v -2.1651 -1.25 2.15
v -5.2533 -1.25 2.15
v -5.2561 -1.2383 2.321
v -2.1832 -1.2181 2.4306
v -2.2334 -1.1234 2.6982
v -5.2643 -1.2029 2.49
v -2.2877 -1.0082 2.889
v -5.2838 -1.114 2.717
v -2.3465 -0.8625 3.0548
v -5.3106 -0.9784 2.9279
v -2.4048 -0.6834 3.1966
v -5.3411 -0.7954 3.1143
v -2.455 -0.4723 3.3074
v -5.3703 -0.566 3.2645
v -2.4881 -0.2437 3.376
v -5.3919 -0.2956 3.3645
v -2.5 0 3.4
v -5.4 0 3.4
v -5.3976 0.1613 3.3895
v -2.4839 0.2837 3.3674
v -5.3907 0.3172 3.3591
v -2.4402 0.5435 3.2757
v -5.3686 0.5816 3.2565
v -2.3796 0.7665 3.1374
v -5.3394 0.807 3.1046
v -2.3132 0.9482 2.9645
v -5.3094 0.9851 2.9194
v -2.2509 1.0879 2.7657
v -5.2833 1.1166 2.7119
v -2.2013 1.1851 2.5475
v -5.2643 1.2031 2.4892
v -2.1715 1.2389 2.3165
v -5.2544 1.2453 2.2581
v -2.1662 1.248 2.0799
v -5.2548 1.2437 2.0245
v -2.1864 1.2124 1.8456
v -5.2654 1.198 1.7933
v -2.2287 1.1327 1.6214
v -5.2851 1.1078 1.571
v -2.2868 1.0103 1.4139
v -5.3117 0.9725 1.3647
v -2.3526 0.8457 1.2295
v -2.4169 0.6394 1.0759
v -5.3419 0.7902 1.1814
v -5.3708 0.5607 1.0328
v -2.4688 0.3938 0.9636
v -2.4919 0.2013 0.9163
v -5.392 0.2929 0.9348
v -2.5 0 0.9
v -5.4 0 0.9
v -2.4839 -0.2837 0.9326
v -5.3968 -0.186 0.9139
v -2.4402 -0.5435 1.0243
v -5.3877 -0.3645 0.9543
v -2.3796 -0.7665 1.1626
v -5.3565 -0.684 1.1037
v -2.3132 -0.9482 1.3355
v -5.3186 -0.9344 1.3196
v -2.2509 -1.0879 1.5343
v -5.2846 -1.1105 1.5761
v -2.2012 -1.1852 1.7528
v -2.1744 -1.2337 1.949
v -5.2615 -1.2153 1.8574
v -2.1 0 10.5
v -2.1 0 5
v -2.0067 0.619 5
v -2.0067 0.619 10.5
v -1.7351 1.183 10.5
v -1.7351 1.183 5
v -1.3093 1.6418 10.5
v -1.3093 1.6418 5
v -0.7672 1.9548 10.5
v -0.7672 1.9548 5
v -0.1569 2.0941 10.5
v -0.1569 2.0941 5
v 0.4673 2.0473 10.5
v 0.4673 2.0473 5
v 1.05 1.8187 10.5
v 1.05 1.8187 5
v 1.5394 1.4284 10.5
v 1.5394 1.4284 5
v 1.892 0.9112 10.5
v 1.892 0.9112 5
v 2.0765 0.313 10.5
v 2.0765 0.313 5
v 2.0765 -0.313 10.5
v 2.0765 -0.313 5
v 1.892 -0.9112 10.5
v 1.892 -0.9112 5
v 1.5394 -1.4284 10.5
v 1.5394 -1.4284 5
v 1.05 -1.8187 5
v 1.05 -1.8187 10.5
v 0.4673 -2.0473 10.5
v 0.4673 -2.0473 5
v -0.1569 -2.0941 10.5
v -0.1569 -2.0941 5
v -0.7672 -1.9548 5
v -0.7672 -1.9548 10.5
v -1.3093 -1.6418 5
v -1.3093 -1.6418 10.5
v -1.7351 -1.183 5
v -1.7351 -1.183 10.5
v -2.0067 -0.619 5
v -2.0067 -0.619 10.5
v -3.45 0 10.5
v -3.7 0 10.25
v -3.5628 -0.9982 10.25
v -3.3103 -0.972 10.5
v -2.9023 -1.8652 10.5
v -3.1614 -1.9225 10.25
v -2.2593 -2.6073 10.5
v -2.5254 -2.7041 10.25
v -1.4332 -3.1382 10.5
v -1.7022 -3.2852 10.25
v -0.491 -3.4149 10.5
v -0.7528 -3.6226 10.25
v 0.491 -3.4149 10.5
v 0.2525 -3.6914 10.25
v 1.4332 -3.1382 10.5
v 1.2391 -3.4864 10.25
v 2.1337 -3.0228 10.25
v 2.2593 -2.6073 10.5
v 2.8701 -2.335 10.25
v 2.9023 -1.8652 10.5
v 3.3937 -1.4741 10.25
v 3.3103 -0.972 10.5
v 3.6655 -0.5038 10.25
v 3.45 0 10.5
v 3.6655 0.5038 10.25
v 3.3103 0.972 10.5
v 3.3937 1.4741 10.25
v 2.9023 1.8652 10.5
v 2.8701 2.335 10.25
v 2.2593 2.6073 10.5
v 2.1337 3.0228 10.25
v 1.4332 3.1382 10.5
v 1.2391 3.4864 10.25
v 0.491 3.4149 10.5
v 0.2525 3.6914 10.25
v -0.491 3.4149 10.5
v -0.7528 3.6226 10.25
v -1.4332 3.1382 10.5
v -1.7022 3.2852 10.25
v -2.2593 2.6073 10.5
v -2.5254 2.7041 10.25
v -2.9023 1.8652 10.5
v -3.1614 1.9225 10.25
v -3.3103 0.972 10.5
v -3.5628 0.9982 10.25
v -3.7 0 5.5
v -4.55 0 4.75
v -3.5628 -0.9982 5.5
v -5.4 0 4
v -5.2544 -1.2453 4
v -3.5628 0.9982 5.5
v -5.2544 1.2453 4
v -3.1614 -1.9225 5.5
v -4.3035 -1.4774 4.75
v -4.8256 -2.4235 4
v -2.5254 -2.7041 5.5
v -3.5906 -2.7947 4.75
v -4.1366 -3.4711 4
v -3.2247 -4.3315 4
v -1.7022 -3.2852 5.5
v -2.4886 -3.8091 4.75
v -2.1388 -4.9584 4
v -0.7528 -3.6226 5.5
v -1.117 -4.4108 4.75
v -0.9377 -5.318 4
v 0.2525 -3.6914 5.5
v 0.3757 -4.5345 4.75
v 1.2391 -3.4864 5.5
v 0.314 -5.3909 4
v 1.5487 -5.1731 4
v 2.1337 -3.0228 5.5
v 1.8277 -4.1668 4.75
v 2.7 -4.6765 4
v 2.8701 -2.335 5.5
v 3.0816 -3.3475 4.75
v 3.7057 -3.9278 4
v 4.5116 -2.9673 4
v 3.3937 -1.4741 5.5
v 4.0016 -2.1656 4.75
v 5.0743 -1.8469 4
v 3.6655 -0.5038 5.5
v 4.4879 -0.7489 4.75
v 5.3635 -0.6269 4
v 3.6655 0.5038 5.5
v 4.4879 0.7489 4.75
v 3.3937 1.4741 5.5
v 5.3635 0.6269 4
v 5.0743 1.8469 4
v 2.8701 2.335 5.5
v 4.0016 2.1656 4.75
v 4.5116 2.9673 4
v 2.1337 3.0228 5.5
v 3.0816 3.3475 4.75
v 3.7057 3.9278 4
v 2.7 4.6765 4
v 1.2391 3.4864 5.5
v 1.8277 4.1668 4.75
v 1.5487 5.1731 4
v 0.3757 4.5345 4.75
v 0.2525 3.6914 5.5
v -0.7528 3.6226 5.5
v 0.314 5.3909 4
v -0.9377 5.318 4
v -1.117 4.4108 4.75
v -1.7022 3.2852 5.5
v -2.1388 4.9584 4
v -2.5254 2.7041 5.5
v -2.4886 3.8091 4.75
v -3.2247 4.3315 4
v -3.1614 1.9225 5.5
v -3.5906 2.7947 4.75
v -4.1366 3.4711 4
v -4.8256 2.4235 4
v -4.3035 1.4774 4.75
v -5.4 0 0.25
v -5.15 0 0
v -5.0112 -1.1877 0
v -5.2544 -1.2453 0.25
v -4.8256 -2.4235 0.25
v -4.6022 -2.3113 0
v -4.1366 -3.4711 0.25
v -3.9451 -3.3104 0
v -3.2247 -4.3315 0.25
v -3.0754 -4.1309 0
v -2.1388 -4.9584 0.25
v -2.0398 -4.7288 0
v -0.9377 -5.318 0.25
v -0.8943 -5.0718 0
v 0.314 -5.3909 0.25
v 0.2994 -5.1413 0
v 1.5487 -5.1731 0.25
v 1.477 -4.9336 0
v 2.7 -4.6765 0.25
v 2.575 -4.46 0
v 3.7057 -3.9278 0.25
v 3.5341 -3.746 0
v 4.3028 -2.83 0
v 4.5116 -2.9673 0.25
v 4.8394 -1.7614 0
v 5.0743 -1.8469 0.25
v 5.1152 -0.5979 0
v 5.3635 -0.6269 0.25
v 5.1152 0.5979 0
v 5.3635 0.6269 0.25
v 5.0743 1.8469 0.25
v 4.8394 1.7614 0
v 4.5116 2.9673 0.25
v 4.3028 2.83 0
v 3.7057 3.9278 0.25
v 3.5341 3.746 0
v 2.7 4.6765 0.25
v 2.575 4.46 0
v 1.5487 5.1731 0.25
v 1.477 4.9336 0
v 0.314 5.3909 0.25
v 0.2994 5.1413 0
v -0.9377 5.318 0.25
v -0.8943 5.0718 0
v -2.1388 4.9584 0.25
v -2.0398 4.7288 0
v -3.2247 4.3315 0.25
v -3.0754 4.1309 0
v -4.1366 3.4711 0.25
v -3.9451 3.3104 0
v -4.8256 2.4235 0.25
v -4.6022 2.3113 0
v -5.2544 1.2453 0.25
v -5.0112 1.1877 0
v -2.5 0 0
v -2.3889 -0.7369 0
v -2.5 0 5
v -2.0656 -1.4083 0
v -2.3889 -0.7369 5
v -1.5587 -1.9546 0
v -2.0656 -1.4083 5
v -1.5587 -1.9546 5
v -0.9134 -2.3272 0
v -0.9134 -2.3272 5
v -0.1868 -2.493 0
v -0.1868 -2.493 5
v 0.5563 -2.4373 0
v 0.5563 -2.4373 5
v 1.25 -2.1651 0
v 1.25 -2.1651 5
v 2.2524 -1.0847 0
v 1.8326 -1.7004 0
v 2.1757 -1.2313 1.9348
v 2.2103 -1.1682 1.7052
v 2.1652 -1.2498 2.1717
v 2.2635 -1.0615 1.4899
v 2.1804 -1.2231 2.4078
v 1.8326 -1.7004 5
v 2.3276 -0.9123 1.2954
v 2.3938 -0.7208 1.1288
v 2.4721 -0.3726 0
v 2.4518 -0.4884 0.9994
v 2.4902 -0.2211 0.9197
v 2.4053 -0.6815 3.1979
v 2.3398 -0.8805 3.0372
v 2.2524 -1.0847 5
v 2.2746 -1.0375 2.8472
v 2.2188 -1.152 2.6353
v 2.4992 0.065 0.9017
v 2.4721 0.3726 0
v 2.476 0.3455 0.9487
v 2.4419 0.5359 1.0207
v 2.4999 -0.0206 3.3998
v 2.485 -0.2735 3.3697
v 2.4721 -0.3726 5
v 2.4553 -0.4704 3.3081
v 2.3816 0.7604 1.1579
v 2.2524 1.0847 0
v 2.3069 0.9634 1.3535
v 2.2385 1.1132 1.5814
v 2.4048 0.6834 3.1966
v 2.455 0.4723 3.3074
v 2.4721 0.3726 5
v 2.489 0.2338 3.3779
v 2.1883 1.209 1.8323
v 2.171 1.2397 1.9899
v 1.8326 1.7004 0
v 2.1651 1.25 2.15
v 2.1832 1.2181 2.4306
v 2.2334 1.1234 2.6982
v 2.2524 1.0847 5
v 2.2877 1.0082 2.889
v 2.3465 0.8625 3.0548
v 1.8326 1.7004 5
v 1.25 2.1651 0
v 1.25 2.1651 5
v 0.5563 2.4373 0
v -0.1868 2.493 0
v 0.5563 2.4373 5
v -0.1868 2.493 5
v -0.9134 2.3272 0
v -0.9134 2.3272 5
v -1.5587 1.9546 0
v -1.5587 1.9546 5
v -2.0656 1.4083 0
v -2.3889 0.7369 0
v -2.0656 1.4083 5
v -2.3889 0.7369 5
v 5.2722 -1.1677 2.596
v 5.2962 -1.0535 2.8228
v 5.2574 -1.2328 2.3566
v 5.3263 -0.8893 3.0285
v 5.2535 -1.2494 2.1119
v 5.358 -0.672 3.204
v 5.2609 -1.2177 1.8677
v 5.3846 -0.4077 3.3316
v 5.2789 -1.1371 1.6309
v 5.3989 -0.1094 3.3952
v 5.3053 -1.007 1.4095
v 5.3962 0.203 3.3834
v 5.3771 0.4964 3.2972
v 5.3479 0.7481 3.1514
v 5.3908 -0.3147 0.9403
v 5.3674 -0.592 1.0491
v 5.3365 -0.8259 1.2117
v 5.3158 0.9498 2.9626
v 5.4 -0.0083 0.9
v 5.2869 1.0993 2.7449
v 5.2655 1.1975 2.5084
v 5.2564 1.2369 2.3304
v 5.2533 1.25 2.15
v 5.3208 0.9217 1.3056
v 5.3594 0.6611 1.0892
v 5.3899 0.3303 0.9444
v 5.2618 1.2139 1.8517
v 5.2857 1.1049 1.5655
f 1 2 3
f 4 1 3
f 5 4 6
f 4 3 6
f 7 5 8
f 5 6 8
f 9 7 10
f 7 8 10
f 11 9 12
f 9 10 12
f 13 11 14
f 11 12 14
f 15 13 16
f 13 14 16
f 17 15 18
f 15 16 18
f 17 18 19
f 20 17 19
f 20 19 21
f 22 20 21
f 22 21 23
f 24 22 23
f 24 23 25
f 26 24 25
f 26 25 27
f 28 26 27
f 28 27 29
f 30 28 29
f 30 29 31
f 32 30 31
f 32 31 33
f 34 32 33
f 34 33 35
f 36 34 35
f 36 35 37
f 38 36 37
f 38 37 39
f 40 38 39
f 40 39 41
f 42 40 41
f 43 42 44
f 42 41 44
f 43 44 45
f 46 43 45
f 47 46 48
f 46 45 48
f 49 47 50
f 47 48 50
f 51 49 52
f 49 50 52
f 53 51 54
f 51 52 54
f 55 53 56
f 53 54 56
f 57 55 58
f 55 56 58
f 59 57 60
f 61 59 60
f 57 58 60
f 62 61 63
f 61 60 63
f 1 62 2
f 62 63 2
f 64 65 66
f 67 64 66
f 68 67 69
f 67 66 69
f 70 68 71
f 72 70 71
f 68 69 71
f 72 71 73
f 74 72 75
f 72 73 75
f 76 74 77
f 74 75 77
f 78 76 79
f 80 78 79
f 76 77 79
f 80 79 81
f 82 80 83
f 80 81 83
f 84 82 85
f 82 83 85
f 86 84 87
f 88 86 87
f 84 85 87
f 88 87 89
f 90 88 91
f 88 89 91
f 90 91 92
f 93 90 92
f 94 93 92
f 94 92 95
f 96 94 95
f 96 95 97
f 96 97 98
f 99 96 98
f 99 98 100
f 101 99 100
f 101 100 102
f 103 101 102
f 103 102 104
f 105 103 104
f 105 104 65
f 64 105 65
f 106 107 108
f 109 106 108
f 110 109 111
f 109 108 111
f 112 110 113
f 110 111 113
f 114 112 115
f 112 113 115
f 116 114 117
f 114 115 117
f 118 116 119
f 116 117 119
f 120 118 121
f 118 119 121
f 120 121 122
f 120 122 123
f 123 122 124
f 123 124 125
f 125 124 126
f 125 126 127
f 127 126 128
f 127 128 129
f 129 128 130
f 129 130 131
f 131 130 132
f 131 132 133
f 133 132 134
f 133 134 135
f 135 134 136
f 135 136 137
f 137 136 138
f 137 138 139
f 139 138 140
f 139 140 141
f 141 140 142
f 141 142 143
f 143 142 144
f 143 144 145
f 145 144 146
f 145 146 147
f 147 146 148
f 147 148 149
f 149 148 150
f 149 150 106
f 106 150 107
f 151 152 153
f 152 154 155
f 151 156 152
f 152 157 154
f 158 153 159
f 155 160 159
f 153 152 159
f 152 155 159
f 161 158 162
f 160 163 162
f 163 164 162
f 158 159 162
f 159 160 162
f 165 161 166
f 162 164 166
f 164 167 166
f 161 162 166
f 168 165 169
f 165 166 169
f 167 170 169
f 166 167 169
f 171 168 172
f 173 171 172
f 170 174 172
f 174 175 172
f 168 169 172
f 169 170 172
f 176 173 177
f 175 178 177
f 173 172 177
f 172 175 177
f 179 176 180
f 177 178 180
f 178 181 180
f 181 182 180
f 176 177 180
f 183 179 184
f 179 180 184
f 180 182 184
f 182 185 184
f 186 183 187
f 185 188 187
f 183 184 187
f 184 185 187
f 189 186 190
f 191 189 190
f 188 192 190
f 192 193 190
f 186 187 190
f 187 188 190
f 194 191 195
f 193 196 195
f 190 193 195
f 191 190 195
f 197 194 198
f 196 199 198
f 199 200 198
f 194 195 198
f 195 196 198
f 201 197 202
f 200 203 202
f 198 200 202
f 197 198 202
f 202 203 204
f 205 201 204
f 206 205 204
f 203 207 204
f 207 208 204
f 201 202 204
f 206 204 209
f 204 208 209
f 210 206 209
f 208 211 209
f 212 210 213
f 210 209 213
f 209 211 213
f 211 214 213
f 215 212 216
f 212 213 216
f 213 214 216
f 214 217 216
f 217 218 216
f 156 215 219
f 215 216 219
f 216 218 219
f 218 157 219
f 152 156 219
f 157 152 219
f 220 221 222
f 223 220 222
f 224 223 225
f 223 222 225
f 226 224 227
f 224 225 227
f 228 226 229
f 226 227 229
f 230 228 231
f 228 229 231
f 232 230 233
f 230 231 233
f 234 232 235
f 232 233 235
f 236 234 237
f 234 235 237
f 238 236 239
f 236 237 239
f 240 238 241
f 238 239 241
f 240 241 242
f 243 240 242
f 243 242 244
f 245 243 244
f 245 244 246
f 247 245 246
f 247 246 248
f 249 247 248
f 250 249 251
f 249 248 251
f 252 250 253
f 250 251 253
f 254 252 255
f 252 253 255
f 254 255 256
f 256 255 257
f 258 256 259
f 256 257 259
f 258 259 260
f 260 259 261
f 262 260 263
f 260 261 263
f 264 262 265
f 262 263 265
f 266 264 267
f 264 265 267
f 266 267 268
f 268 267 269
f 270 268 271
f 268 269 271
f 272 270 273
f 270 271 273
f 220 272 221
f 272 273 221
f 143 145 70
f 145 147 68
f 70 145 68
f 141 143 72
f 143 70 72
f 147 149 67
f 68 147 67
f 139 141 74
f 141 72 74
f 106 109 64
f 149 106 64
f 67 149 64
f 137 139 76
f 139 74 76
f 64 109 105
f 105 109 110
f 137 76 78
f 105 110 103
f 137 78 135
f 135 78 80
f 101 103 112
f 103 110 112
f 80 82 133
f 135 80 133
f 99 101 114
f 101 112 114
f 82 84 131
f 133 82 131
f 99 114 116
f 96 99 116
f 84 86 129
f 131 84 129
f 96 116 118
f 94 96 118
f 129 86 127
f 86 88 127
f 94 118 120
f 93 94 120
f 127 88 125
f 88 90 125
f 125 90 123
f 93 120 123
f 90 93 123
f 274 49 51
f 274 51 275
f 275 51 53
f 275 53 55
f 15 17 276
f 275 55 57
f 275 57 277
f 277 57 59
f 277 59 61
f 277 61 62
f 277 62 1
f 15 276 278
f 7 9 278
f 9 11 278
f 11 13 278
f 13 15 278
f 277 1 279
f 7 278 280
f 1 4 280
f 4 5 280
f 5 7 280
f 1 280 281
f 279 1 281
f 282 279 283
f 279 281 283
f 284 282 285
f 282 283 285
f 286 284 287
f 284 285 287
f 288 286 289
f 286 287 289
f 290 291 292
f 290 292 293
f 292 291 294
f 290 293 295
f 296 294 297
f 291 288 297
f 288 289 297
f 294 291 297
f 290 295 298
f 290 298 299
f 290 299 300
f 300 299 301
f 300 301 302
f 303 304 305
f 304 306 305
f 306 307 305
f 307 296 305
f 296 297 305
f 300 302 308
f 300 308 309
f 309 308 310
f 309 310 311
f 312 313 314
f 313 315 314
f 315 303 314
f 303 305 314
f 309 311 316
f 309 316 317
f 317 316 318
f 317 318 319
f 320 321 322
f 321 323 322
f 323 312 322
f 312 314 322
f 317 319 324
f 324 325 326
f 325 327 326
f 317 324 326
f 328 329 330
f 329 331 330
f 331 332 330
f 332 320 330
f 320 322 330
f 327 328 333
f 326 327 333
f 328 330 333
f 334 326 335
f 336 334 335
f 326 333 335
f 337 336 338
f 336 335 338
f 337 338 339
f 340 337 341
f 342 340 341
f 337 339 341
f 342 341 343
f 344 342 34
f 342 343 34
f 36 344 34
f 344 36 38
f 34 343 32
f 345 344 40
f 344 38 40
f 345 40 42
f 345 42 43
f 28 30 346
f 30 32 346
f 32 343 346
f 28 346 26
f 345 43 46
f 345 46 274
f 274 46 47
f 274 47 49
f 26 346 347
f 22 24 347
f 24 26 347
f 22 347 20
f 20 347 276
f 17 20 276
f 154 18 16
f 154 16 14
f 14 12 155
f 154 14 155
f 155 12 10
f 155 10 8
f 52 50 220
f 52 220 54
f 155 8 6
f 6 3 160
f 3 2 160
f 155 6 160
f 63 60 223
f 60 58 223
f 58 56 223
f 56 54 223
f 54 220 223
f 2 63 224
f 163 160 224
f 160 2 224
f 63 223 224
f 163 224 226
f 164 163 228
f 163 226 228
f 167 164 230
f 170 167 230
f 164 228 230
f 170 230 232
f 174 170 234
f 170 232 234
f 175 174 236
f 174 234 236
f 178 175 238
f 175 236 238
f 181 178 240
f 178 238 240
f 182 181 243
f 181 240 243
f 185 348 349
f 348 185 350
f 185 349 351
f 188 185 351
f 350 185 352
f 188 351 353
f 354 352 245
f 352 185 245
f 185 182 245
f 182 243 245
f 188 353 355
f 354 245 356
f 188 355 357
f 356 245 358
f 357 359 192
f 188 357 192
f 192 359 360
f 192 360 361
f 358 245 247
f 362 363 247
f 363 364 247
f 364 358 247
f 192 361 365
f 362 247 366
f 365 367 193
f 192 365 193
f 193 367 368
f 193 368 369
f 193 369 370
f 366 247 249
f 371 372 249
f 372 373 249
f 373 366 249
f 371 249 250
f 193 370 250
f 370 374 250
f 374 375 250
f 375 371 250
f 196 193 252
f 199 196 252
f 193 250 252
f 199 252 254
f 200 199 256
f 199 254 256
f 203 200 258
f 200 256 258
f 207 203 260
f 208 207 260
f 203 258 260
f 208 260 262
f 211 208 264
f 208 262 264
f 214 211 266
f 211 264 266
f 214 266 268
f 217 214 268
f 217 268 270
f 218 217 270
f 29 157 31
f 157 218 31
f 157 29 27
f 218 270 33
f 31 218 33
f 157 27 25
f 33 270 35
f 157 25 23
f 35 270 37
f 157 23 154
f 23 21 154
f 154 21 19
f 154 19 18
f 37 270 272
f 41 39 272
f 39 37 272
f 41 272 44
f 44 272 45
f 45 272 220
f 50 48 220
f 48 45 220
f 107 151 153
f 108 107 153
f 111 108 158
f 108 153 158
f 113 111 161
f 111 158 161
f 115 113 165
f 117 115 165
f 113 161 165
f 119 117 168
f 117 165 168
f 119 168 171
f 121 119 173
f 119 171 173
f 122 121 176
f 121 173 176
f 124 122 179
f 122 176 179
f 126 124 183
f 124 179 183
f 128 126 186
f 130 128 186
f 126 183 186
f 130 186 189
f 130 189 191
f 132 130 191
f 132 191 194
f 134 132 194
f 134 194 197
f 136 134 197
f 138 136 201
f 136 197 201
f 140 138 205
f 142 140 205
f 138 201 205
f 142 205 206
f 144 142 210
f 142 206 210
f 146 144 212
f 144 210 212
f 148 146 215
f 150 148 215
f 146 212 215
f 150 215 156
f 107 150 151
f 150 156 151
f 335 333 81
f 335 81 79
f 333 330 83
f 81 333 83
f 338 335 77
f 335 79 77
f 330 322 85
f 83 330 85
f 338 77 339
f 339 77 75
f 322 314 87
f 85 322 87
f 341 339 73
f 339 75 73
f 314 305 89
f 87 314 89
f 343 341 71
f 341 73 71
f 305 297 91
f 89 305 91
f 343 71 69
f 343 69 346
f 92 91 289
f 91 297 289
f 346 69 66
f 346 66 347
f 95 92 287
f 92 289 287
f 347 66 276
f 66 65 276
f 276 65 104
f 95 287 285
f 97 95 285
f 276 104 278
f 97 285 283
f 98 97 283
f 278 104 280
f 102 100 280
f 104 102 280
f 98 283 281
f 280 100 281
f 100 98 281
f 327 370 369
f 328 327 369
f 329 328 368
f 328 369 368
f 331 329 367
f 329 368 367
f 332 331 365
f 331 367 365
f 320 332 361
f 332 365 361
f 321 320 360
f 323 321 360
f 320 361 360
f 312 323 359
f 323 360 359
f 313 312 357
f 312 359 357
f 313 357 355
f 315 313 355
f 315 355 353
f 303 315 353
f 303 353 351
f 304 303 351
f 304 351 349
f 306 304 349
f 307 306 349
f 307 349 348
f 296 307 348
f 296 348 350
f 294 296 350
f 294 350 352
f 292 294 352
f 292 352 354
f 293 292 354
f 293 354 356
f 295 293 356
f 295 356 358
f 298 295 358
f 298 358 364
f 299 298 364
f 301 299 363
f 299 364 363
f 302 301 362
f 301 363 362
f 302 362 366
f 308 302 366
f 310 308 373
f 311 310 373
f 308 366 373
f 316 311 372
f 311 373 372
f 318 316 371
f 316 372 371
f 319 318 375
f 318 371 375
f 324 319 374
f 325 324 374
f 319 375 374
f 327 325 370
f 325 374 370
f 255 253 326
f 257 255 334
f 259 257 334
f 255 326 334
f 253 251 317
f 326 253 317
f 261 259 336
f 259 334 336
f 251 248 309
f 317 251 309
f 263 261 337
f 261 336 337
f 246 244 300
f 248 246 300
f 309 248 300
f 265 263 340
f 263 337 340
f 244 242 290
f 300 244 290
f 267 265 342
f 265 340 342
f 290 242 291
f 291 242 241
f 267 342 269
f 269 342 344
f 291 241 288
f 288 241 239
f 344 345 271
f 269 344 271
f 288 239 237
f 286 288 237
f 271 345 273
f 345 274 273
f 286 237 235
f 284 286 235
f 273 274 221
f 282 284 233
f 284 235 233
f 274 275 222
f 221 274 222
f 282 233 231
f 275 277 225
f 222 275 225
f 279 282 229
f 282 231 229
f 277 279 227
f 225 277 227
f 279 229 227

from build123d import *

# Parameters (mm, degrees)
CONNECTOR_M5X0_8_TAPPED_HOLE_D        = 4.2
SET_SCREW_1_M3X0_5_TAPPED_HOLE_REACH  = 16.681
SET_SCREW_1_M3X0_5_TAPPED_HOLE_BORE_R = 1.25
SET_SCREW_2_PATTERN_COUNT             = 2
EDGE_CHAMFERS_SIZE                    = 0.25


with BuildPart() as part:
    # Body Sketch → Body Revolve (revolve)
    with BuildSketch(Plane(origin=(0, 0, 0), x_dir=(-1, 0, 0), z_dir=(0, 1, 0))):
        Polygon((1, 10.5), (3.7, 10.5), (3.7, 5.5), (5.4, 4), (5.4, 0), (2.5, 0), (2.5, 5), (1, 5), align=None)
    revolve(axis=Axis((0, 0, 0), (0, 0, 1)))

    # Connector M5x0.8 Tapped Hole (through all)
    with Locations(Plane.XY.offset(10.5)):
        with Locations((0, 0)):
            Hole(CONNECTOR_M5X0_8_TAPPED_HOLE_D / 2)

    # Set Screw 1 M3x0.5 Tapped Hole bore (on position points) → Set Screw 1 M3x0.5 Tapped Hole (cut, up to next)
    with BuildSketch(Plane(origin=(5.4, 0, 2.15), x_dir=(0, 1, 0), z_dir=(1, 0, 0)), mode=Mode.PRIVATE) as set_screw_1_m3x0_5_tapped_hole_sk1:
        Circle(SET_SCREW_1_M3X0_5_TAPPED_HOLE_BORE_R)
    set_screw_1_m3x0_5_tapped_hole_tool1 = extrude(set_screw_1_m3x0_5_tapped_hole_sk1.sketch, amount=-SET_SCREW_1_M3X0_5_TAPPED_HOLE_REACH, mode=Mode.PRIVATE) & part.part
    set_screw_1_m3x0_5_tapped_hole = set_screw_1_m3x0_5_tapped_hole_tool1.solids().sort_by_distance((5.4, 0, 2.15))[0]
    add(set_screw_1_m3x0_5_tapped_hole, mode=Mode.SUBTRACT)

    # Set Screw 2 Pattern: Set Screw 1 M3x0.5 Tapped Hole ×2 about axis
    set_screw_2_pattern_axis = Axis((0, 0, 0), (0, 0, 1))
    for i in range(1, SET_SCREW_2_PATTERN_COUNT):
        add(set_screw_1_m3x0_5_tapped_hole.rotate(set_screw_2_pattern_axis, i * 360 / SET_SCREW_2_PATTERN_COUNT), mode=Mode.SUBTRACT)

    # Edge Chamfers
    edge_chamfers_edges = [part.edges().sort_by_distance(p)[0] for p in [
        (5.4, 0, 0),
        (3.7, 0, 10.5),
    ]]
    chamfer(edge_chamfers_edges, length=EDGE_CHAMFERS_SIZE)


solid = part.part
